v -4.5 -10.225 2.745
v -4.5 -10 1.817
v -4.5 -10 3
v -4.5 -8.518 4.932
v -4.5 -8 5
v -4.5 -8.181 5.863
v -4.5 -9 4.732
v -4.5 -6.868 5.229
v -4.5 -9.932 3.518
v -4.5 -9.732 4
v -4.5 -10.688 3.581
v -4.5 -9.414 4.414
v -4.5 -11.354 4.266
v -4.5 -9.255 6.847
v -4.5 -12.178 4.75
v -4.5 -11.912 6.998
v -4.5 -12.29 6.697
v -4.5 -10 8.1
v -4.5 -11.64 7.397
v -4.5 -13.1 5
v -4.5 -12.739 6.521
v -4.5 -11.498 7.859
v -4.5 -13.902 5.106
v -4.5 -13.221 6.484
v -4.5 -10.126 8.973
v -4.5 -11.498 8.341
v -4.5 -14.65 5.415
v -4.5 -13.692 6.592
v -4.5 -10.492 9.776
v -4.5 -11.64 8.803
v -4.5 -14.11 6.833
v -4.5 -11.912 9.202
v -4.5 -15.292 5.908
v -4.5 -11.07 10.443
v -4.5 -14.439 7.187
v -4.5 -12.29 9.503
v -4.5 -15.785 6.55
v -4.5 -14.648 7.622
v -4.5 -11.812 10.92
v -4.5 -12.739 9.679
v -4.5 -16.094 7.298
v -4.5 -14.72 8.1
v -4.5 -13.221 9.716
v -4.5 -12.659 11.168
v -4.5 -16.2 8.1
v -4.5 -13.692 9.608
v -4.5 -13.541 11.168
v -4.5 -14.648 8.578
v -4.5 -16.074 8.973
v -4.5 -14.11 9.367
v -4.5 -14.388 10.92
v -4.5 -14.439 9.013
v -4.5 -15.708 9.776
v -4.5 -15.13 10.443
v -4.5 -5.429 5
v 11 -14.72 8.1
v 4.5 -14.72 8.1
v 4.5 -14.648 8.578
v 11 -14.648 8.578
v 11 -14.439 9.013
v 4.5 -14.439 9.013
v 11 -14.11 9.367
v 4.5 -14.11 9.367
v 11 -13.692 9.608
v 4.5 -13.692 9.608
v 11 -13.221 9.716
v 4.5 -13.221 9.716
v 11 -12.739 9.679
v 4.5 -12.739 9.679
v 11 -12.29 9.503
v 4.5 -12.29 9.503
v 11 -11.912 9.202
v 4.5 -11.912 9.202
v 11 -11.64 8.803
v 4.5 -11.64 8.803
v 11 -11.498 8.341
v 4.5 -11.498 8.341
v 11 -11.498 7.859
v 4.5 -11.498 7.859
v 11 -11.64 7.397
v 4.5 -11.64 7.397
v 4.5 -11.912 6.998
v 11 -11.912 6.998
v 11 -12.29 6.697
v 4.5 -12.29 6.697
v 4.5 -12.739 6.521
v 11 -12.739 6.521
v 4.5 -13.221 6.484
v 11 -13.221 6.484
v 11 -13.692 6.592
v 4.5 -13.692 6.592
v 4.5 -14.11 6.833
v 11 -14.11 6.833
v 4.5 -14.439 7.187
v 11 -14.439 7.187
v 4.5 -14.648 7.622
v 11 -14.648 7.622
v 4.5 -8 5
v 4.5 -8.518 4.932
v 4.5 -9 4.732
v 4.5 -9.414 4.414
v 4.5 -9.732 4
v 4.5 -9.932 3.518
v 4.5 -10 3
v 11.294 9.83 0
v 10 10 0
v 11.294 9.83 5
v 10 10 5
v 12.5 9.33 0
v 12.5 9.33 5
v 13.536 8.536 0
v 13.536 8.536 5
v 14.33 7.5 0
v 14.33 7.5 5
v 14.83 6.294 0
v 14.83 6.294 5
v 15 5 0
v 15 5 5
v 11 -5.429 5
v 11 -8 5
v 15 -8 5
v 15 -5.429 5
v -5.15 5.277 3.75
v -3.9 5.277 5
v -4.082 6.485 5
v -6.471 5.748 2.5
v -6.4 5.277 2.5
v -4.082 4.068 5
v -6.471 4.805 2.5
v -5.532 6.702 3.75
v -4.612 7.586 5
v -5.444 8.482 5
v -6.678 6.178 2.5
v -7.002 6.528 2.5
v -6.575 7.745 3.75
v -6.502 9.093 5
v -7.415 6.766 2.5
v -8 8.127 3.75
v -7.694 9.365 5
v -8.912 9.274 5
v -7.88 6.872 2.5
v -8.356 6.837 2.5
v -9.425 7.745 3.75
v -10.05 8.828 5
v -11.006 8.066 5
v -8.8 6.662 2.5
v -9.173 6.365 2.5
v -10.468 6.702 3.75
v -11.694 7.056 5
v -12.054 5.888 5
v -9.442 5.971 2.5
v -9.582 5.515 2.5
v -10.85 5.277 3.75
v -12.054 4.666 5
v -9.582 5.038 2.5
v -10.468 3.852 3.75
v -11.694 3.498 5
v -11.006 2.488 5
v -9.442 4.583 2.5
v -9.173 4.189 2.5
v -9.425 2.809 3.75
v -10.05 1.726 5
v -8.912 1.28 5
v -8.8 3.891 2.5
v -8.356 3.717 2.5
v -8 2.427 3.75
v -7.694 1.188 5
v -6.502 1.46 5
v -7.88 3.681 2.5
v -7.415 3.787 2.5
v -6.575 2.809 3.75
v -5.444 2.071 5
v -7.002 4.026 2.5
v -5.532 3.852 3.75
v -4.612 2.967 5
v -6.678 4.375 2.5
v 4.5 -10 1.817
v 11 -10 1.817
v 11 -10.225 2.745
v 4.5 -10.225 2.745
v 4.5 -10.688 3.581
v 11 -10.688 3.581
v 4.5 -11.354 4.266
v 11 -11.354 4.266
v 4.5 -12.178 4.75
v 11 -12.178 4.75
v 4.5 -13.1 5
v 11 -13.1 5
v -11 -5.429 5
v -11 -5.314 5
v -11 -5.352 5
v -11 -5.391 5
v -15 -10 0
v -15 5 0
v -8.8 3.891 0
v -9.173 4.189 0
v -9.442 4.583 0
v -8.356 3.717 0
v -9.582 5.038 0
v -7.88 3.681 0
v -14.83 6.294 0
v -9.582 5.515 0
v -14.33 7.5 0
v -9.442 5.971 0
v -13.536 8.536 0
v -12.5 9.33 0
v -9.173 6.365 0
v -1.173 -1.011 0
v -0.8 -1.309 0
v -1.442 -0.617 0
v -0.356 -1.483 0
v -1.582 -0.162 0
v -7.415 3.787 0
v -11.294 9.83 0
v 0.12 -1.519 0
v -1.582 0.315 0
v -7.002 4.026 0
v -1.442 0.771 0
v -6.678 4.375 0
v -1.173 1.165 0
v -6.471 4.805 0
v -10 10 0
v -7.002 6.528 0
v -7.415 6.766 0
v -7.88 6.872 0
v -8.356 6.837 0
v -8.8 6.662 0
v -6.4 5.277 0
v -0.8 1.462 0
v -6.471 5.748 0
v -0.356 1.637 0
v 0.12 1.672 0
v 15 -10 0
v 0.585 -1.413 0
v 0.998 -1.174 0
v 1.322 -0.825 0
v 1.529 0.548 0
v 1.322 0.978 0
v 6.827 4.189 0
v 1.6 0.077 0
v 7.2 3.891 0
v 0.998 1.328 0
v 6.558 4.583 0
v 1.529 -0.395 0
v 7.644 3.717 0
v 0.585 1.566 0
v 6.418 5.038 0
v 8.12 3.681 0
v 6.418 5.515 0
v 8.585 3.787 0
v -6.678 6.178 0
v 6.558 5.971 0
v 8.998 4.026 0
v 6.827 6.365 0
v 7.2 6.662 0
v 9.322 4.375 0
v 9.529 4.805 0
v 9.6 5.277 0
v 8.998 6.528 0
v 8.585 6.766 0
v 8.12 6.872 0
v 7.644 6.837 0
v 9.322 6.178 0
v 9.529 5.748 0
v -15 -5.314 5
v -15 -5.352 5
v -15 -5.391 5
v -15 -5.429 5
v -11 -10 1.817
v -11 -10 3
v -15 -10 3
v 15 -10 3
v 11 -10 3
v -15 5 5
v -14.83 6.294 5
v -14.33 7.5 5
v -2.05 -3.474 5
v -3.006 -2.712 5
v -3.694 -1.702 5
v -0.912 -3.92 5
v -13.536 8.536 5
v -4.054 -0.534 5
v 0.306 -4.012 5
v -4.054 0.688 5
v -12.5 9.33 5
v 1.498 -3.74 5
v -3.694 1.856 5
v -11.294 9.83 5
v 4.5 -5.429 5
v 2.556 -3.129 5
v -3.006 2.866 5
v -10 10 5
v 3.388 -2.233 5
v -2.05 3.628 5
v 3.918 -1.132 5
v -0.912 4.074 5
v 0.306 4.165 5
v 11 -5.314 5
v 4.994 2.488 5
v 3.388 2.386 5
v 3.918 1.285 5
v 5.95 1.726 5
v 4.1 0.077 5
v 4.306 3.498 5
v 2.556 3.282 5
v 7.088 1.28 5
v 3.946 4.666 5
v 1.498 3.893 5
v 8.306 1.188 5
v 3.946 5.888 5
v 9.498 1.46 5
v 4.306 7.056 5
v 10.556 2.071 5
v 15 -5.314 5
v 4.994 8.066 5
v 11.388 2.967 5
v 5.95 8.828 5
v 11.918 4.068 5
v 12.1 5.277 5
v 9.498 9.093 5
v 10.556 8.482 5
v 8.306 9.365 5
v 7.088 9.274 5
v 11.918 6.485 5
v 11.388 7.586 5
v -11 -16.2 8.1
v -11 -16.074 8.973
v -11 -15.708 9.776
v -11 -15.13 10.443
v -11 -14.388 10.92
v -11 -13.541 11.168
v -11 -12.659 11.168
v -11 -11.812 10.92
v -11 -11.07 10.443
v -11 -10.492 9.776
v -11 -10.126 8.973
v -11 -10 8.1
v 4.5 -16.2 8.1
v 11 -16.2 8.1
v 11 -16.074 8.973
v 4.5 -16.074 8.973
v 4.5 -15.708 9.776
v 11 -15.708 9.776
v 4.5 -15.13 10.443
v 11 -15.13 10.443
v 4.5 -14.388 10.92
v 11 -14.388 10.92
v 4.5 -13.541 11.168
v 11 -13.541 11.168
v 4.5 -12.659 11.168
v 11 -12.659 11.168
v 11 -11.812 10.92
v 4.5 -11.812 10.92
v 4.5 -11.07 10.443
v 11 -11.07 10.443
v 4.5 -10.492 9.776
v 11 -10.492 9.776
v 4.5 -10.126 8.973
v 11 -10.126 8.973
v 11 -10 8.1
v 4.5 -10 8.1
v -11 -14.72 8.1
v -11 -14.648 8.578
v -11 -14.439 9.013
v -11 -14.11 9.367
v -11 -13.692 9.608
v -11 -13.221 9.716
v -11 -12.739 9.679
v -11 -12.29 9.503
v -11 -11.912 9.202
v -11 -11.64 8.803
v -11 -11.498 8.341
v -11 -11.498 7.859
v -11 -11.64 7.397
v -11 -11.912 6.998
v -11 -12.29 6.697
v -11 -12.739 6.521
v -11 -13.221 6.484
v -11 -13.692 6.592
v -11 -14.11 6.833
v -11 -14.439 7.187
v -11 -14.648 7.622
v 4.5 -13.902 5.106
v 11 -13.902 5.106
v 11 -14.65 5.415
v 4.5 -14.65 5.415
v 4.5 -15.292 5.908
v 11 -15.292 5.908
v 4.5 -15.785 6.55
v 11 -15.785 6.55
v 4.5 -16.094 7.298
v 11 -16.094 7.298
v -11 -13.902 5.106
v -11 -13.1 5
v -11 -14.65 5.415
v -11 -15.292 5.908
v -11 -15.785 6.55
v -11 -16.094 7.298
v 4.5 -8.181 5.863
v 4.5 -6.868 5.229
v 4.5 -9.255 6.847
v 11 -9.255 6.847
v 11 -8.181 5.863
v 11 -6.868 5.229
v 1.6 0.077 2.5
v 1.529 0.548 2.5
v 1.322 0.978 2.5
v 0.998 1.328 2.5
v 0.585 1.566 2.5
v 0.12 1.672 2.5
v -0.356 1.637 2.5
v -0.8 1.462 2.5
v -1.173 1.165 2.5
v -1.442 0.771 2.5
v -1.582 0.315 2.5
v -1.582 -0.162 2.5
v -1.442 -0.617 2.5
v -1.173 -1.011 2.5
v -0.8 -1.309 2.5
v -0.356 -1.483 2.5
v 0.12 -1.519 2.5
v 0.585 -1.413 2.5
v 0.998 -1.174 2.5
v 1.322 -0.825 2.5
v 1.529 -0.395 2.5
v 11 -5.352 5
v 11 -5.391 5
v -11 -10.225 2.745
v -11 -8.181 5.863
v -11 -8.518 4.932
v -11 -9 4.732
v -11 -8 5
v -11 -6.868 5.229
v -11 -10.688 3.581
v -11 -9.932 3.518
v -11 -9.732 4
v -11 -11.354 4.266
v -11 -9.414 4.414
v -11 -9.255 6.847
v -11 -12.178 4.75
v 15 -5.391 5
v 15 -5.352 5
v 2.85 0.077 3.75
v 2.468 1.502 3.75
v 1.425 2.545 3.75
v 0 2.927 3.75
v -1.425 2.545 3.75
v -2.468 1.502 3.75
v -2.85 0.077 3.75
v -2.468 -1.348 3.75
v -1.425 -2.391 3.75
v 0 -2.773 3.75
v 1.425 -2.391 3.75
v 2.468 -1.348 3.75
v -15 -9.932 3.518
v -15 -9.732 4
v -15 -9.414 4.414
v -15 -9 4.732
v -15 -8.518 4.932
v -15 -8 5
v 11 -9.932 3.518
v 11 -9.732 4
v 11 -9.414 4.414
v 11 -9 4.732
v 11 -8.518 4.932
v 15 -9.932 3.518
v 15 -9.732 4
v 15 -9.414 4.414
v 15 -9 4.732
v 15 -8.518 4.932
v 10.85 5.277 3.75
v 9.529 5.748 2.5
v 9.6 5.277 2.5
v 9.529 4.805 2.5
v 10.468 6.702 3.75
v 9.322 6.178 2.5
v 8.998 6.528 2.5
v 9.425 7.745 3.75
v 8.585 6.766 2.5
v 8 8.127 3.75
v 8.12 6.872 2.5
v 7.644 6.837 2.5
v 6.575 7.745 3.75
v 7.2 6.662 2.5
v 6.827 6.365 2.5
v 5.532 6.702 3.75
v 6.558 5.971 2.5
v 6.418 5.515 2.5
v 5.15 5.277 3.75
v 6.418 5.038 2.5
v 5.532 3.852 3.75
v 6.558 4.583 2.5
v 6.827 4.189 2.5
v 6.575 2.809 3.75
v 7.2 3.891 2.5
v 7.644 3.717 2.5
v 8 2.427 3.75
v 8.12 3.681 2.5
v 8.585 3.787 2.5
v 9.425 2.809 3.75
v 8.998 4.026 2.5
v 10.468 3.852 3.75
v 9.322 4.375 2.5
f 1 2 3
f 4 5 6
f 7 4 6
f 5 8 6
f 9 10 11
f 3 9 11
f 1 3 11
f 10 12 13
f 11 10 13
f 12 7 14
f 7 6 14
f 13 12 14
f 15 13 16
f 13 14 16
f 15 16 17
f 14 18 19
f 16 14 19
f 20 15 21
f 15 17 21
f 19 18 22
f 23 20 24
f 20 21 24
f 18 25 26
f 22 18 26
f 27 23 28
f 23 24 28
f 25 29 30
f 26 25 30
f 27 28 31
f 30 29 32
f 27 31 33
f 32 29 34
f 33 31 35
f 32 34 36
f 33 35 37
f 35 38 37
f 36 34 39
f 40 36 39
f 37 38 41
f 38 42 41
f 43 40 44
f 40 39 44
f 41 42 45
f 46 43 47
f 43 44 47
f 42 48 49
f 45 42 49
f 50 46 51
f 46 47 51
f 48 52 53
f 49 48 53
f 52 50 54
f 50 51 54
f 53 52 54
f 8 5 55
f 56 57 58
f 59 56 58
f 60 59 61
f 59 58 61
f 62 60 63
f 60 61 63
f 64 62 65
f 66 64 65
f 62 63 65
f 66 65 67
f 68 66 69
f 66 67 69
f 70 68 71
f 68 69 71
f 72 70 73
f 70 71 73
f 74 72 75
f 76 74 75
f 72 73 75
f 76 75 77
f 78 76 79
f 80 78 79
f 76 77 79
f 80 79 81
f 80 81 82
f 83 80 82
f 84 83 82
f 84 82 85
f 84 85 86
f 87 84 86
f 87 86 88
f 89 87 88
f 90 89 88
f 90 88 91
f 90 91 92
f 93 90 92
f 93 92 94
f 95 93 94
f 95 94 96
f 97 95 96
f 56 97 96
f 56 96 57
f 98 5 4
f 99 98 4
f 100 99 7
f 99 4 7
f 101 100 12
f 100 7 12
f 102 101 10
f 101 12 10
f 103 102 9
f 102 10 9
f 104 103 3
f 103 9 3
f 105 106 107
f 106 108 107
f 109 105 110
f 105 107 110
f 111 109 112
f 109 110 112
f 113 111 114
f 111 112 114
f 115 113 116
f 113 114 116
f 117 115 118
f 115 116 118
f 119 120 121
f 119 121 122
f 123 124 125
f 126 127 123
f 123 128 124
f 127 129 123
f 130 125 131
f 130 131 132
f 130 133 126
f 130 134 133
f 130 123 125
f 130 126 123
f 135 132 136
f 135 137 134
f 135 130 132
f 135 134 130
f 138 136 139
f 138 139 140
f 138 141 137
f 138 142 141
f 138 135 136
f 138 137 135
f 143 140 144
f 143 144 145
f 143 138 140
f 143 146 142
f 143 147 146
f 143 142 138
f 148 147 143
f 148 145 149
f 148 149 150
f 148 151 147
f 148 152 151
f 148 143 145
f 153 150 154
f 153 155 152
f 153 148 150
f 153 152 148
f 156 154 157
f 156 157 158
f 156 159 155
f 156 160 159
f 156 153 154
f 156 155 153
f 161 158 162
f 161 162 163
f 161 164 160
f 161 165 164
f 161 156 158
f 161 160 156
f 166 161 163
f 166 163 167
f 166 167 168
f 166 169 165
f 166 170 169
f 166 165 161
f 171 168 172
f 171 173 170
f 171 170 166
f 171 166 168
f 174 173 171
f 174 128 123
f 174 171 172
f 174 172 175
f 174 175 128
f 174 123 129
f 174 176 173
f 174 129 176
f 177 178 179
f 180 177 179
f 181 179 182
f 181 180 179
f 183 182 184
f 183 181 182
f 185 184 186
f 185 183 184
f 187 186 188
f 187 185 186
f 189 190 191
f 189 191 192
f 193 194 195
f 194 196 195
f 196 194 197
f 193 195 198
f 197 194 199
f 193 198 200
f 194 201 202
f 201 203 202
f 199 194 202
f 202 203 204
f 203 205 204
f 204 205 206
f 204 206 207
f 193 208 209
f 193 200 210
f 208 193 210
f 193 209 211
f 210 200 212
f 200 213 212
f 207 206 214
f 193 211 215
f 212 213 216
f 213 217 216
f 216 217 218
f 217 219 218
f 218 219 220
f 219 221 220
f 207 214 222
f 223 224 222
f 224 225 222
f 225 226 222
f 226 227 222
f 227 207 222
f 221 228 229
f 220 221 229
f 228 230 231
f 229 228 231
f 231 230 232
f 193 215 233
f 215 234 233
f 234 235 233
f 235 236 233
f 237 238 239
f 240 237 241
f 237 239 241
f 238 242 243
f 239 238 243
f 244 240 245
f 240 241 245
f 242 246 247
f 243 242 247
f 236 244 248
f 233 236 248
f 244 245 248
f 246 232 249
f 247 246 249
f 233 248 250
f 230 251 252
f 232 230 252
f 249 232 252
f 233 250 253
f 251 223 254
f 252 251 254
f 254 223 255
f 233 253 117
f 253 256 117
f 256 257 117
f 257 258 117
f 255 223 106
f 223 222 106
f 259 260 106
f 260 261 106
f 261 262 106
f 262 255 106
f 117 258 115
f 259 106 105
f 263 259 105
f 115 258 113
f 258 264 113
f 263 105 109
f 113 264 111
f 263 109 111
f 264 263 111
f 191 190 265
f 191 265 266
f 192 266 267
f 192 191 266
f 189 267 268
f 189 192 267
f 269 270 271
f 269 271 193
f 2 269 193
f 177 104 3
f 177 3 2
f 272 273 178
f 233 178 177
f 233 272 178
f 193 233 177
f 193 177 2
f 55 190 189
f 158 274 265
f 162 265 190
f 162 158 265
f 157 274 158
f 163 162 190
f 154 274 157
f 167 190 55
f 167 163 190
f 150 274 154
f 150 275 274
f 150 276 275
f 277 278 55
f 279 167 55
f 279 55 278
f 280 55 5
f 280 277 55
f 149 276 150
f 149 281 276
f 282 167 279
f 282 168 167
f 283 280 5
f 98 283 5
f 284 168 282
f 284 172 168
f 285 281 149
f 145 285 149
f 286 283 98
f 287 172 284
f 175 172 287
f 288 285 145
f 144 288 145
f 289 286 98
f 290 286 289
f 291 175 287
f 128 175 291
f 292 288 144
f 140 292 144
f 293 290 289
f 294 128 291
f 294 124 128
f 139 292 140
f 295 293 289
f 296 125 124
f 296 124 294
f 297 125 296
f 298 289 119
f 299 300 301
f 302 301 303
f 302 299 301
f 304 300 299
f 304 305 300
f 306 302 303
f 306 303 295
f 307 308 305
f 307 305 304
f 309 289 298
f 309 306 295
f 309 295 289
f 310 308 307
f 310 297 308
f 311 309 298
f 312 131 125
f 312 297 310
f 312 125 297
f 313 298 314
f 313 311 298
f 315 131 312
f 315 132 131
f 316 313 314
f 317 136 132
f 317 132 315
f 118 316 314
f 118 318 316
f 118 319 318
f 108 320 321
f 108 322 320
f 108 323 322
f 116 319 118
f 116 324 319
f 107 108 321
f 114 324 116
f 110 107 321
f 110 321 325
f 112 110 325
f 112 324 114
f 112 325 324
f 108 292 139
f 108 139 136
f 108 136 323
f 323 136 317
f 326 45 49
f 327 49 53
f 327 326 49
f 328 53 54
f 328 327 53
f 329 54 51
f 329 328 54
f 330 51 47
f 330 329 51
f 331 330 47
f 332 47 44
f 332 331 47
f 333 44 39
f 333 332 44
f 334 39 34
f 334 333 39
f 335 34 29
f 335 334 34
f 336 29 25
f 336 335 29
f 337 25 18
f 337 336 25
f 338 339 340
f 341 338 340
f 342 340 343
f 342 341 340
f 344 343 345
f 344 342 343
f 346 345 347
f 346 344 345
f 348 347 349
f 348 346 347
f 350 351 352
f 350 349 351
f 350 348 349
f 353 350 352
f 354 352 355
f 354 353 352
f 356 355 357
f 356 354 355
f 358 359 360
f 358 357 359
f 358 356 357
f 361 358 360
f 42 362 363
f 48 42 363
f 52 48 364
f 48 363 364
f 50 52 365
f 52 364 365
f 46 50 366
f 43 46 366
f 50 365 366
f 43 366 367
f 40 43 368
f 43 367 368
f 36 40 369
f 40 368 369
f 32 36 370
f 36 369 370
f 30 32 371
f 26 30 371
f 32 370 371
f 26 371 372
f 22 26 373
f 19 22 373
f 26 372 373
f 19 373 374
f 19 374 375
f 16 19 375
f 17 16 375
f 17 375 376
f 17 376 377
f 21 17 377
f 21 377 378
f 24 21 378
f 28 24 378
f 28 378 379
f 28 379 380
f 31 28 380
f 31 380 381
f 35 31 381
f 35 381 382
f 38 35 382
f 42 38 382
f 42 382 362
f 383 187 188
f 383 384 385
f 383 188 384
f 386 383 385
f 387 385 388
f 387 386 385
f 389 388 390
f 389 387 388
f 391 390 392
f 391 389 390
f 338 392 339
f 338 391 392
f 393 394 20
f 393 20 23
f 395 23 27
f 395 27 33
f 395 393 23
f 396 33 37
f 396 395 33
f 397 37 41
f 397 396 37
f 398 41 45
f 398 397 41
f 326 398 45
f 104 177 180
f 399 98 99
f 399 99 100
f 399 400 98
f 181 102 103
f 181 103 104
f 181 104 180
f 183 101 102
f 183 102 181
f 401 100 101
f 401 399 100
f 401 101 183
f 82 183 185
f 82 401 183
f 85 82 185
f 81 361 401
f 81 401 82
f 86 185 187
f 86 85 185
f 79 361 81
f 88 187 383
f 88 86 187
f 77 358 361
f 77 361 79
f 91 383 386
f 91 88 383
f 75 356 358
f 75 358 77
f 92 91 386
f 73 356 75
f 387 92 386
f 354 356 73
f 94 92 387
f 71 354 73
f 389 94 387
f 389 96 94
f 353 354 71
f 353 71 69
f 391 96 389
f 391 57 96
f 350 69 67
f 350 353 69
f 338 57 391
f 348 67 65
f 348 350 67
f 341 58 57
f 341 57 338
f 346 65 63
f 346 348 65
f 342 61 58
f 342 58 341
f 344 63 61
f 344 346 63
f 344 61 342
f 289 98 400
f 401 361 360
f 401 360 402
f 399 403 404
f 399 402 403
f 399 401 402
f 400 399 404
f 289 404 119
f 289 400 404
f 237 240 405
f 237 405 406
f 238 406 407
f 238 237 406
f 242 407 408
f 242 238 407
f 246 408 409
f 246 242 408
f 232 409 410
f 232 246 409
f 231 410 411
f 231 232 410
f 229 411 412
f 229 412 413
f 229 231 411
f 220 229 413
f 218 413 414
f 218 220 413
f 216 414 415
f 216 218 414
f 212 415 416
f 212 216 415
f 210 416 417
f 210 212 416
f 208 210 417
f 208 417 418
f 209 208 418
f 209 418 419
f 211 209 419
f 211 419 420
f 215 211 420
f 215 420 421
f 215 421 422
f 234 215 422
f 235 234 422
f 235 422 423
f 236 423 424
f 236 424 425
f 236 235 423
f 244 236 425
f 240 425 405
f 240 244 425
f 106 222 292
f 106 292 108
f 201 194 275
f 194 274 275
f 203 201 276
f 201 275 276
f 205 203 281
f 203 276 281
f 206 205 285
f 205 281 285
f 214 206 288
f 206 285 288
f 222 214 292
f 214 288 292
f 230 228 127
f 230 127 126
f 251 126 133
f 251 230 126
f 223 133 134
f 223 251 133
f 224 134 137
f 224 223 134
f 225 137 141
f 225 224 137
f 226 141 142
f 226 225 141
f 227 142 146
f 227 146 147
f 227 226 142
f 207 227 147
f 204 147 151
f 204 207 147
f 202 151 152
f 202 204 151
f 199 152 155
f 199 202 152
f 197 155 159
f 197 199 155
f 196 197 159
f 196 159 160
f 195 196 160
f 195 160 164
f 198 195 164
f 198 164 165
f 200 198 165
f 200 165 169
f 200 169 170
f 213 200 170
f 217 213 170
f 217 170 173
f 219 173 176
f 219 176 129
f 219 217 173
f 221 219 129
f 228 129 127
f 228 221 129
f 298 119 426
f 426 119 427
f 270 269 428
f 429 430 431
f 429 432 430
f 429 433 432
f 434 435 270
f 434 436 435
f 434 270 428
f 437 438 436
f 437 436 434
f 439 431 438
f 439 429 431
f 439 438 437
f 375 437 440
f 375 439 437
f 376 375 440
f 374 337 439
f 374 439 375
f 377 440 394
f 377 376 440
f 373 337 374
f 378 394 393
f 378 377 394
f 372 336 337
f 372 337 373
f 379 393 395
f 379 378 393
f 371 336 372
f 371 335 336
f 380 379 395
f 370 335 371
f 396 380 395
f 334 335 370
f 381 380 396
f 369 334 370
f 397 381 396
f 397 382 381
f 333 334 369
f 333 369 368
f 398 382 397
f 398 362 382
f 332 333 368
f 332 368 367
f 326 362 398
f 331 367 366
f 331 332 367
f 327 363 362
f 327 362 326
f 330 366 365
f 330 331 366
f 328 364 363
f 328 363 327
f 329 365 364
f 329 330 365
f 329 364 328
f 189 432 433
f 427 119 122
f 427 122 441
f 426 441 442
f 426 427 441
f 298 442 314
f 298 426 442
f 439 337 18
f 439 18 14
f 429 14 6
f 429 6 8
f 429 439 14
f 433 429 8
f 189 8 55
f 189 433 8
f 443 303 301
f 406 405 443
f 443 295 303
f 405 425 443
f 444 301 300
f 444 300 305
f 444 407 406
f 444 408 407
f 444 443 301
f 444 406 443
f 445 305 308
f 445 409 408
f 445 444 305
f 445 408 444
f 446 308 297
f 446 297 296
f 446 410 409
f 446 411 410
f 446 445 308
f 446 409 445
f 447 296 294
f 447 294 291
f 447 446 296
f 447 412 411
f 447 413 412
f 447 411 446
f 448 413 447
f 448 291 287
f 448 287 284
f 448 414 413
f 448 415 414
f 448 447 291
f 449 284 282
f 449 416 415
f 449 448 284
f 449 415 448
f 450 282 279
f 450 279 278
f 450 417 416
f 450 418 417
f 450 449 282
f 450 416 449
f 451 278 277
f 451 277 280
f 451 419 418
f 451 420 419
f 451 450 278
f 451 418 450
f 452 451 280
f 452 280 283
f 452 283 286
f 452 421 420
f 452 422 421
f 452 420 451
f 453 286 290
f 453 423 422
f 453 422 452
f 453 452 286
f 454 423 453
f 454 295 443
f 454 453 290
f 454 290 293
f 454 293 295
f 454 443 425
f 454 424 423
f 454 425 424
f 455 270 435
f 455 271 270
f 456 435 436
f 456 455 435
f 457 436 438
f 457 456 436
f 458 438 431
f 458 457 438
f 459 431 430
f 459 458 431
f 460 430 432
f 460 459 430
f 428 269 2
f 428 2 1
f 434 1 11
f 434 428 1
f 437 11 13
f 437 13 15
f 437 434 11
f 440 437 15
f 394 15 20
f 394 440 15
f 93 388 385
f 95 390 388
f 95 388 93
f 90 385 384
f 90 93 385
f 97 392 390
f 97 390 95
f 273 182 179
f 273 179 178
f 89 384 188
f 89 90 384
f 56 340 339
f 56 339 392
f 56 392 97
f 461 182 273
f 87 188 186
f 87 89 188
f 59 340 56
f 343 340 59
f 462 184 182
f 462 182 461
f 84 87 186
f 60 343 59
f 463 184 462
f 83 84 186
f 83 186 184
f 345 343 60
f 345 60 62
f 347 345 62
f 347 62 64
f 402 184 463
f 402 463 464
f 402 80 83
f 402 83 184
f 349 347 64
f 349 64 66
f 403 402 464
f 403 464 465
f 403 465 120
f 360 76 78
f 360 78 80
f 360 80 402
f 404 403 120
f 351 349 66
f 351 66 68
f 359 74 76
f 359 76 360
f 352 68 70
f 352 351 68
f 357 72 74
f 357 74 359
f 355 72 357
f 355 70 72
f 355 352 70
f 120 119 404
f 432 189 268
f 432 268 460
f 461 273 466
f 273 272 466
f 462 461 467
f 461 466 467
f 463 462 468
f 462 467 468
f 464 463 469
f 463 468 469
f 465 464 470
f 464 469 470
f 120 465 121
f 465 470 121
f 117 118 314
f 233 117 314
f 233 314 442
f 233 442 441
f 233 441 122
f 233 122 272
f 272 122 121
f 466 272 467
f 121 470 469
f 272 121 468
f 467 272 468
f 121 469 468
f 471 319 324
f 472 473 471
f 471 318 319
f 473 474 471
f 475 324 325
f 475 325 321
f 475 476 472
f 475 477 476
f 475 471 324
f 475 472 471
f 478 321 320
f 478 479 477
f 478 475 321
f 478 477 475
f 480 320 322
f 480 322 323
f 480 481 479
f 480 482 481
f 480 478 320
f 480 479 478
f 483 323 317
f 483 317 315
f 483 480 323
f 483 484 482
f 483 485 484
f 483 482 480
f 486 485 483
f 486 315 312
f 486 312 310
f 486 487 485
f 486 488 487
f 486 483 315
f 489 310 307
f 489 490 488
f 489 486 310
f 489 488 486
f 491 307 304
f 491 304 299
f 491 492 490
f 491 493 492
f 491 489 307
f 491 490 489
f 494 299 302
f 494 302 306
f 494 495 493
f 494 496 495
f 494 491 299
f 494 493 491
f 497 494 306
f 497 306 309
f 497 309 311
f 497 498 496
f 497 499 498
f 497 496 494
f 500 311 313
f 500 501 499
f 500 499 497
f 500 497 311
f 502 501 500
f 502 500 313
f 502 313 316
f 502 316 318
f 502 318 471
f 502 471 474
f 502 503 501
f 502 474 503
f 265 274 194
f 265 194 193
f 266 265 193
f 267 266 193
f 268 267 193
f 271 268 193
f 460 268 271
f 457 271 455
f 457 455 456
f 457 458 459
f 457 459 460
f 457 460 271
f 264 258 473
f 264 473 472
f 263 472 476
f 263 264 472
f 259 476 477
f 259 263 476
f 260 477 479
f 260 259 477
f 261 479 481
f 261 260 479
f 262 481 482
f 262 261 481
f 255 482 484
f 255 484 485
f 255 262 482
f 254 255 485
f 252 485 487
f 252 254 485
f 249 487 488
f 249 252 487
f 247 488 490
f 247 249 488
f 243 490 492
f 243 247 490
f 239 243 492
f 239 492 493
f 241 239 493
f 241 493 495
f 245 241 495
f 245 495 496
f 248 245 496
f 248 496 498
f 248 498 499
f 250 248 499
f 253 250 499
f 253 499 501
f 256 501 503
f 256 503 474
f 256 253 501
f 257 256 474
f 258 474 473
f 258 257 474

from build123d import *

# Parameters (mm, degrees)
F0_W      = 30
F0_H      = 20
F0_R      = 1.6
F1_DEPTH  = 5
F3_DEPTH  = 30
F7_DEPTH  = 7
F9_DEPTH  = 7
F10_SIZE  = 2.5
F11_R     = 5
F12_R     = 1.6200998357
F13_DEPTH = 30.001
F14_R     = 2
F17_DEPTH = 9


with BuildPart() as f1:
    # F0 (on Top) → F1 (new body)
    with BuildSketch(Plane.XY):
        Rectangle(F0_W, F0_H)
        with Locations((-8, 5.2767994255)):
            Circle(F0_R, mode=Mode.SUBTRACT)
        with Locations((0, 0.0767994255)):
            Circle(F0_R, mode=Mode.SUBTRACT)
        with Locations((8, 5.2767994255)):
            Circle(F0_R, mode=Mode.SUBTRACT)
    extrude(amount=F1_DEPTH)

    # F2 (on face) → F3 (join, through all)
    with BuildSketch(Plane(origin=(-15, 0, 0), x_dir=(0, -1, 0), z_dir=(-1, 0, 0))):
        with BuildLine():
            ThreePointArc((13.1, 5), (15.2920310217, 5.9079689783), (16.2, 8.1))
            ThreePointArc((16.2, 8.1), (13.1, 11.2), (10, 8.1))
            ThreePointArc((10, 8.1), (10.9079689783, 5.9079689783), (13.1, 5))
        make_face()
        with BuildLine():
            ThreePointArc((13.1, 5), (10.9079689783, 5.9079689783), (10, 8.1))
            ThreePointArc((10, 8.1), (8.1808280522, 5.8625059643), (5.4291286506, 5))
            Line((5.4291286506, 5), (10, 5))
            Line((10, 5), (10, 1.816622098))
            ThreePointArc((10, 1.816622098), (10.998268655, 3.9455916428), (13.1, 5))
        make_face()
    extrude(amount=-F3_DEPTH)

    # F6 (on offset) → F7 (cut)
    with BuildSketch(Plane.YZ.offset(11)):
        with BuildLine():
            ThreePointArc((-13.1, 5), (-10.9079689783, 5.9079689783), (-10, 8.1))
            ThreePointArc((-10, 8.1), (-15.2920310217, 10.2920310217), (-13.1, 5))
        make_face()
        with BuildLine():
            ThreePointArc((-5.4291286506, 5), (-8.1808280522, 5.8625059643), (-10, 8.1))
            ThreePointArc((-10, 8.1), (-10.9079689783, 5.9079689783), (-13.1, 5))
            ThreePointArc((-13.1, 5), (-10.998268655, 3.9455916428), (-10, 1.816622098))
            Line((-10, 1.816622098), (-10, 5))
            Line((-10, 5), (-5.4291286506, 5))
        make_face()
        with BuildLine():
            Line((-5.3136004135, 5), (-5.4291286506, 5))
            ThreePointArc((-5.4291286506, 5), (-5.371364532, 4.9996666743), (-5.3136004135, 5))
        make_face()
    extrude(amount=F7_DEPTH, mode=Mode.SUBTRACT)

    # F8 (on offset) → F9 (cut)
    with BuildSketch(Plane(origin=(-11, 0, 0), x_dir=(0, -1, 0), z_dir=(-1, 0, 0))):
        with BuildLine():
            ThreePointArc((13.1, 5), (15.2920310217, 5.9079689783), (16.2, 8.1))
            ThreePointArc((16.2, 8.1), (13.1, 11.2), (10, 8.1))
            ThreePointArc((10, 8.1), (10.9079689783, 5.9079689783), (13.1, 5))
        make_face()
        with BuildLine():
            ThreePointArc((5.3136004135, 5), (5.371364532, 4.9996666743), (5.4291286506, 5))
            Line((5.4291286506, 5), (5.3136004135, 5))
        make_face()
        with BuildLine():
            ThreePointArc((13.1, 5), (10.9079689783, 5.9079689783), (10, 8.1))
            ThreePointArc((10, 8.1), (8.1808280522, 5.8625059643), (5.4291286506, 5))
            Line((5.4291286506, 5), (10, 5))
            Line((10, 5), (10, 1.816622098))
            ThreePointArc((10, 1.816622098), (10.998268655, 3.9455916428), (13.1, 5))
        make_face()
    extrude(amount=F9_DEPTH, mode=Mode.SUBTRACT)

    # F10
    f10_edges = [f1.edges().sort_by_distance(p)[0] for p in [
        (-9.6, 5.276799, 5),
        (-1.6, 0.076799, 5),
        (6.4, 5.276799, 5),
    ]]
    chamfer(f10_edges, length=F10_SIZE)

    # F11
    f11_edges = [f1.edges().sort_by_distance(p)[0] for p in [
        (-15, 10, 2.5),
        (15, 10, 2.5),
    ]]
    fillet(f11_edges, radius=F11_R)

    # F12 (on face) → F13 (cut, through all)
    with BuildSketch(Plane(origin=(-15, 0, 0), x_dir=(0, -1, 0), z_dir=(-1, 0, 0))):
        with Locations((13.1, 8.1)):
            Circle(F12_R)
    extrude(amount=-F13_DEPTH, mode=Mode.SUBTRACT)

    # F14
    f14_edges = [f1.edges().sort_by_distance(p)[0] for p in [
        (-13, -10, 5),
        (13, -10, 5),
    ]]
    fillet(f14_edges, radius=F14_R)

    # F16 (on offset) → F17 (cut)
    with BuildSketch(Plane(origin=(-4.5, 0, 0), x_dir=(0, -1, 0), z_dir=(-1, 0, 0))):
        with BuildLine():
            ThreePointArc((10, 1.816622098), (10.998268655, 3.9455916428), (13.1, 5))
            ThreePointArc((13.1, 5), (15.2920310217, 10.2920310217), (10, 8.1))
            ThreePointArc((10, 8.1), (8.1808280522, 5.8625059643), (5.4291286506, 5))
            Line((5.4291286506, 5), (8, 5))
            ThreePointArc((8, 5), (9.4142135624, 4.4142135624), (10, 3))
            Line((10, 3), (10, 1.816622098))
        make_face()
    extrude(amount=-F17_DEPTH, mode=Mode.SUBTRACT)


solid = f1.part
